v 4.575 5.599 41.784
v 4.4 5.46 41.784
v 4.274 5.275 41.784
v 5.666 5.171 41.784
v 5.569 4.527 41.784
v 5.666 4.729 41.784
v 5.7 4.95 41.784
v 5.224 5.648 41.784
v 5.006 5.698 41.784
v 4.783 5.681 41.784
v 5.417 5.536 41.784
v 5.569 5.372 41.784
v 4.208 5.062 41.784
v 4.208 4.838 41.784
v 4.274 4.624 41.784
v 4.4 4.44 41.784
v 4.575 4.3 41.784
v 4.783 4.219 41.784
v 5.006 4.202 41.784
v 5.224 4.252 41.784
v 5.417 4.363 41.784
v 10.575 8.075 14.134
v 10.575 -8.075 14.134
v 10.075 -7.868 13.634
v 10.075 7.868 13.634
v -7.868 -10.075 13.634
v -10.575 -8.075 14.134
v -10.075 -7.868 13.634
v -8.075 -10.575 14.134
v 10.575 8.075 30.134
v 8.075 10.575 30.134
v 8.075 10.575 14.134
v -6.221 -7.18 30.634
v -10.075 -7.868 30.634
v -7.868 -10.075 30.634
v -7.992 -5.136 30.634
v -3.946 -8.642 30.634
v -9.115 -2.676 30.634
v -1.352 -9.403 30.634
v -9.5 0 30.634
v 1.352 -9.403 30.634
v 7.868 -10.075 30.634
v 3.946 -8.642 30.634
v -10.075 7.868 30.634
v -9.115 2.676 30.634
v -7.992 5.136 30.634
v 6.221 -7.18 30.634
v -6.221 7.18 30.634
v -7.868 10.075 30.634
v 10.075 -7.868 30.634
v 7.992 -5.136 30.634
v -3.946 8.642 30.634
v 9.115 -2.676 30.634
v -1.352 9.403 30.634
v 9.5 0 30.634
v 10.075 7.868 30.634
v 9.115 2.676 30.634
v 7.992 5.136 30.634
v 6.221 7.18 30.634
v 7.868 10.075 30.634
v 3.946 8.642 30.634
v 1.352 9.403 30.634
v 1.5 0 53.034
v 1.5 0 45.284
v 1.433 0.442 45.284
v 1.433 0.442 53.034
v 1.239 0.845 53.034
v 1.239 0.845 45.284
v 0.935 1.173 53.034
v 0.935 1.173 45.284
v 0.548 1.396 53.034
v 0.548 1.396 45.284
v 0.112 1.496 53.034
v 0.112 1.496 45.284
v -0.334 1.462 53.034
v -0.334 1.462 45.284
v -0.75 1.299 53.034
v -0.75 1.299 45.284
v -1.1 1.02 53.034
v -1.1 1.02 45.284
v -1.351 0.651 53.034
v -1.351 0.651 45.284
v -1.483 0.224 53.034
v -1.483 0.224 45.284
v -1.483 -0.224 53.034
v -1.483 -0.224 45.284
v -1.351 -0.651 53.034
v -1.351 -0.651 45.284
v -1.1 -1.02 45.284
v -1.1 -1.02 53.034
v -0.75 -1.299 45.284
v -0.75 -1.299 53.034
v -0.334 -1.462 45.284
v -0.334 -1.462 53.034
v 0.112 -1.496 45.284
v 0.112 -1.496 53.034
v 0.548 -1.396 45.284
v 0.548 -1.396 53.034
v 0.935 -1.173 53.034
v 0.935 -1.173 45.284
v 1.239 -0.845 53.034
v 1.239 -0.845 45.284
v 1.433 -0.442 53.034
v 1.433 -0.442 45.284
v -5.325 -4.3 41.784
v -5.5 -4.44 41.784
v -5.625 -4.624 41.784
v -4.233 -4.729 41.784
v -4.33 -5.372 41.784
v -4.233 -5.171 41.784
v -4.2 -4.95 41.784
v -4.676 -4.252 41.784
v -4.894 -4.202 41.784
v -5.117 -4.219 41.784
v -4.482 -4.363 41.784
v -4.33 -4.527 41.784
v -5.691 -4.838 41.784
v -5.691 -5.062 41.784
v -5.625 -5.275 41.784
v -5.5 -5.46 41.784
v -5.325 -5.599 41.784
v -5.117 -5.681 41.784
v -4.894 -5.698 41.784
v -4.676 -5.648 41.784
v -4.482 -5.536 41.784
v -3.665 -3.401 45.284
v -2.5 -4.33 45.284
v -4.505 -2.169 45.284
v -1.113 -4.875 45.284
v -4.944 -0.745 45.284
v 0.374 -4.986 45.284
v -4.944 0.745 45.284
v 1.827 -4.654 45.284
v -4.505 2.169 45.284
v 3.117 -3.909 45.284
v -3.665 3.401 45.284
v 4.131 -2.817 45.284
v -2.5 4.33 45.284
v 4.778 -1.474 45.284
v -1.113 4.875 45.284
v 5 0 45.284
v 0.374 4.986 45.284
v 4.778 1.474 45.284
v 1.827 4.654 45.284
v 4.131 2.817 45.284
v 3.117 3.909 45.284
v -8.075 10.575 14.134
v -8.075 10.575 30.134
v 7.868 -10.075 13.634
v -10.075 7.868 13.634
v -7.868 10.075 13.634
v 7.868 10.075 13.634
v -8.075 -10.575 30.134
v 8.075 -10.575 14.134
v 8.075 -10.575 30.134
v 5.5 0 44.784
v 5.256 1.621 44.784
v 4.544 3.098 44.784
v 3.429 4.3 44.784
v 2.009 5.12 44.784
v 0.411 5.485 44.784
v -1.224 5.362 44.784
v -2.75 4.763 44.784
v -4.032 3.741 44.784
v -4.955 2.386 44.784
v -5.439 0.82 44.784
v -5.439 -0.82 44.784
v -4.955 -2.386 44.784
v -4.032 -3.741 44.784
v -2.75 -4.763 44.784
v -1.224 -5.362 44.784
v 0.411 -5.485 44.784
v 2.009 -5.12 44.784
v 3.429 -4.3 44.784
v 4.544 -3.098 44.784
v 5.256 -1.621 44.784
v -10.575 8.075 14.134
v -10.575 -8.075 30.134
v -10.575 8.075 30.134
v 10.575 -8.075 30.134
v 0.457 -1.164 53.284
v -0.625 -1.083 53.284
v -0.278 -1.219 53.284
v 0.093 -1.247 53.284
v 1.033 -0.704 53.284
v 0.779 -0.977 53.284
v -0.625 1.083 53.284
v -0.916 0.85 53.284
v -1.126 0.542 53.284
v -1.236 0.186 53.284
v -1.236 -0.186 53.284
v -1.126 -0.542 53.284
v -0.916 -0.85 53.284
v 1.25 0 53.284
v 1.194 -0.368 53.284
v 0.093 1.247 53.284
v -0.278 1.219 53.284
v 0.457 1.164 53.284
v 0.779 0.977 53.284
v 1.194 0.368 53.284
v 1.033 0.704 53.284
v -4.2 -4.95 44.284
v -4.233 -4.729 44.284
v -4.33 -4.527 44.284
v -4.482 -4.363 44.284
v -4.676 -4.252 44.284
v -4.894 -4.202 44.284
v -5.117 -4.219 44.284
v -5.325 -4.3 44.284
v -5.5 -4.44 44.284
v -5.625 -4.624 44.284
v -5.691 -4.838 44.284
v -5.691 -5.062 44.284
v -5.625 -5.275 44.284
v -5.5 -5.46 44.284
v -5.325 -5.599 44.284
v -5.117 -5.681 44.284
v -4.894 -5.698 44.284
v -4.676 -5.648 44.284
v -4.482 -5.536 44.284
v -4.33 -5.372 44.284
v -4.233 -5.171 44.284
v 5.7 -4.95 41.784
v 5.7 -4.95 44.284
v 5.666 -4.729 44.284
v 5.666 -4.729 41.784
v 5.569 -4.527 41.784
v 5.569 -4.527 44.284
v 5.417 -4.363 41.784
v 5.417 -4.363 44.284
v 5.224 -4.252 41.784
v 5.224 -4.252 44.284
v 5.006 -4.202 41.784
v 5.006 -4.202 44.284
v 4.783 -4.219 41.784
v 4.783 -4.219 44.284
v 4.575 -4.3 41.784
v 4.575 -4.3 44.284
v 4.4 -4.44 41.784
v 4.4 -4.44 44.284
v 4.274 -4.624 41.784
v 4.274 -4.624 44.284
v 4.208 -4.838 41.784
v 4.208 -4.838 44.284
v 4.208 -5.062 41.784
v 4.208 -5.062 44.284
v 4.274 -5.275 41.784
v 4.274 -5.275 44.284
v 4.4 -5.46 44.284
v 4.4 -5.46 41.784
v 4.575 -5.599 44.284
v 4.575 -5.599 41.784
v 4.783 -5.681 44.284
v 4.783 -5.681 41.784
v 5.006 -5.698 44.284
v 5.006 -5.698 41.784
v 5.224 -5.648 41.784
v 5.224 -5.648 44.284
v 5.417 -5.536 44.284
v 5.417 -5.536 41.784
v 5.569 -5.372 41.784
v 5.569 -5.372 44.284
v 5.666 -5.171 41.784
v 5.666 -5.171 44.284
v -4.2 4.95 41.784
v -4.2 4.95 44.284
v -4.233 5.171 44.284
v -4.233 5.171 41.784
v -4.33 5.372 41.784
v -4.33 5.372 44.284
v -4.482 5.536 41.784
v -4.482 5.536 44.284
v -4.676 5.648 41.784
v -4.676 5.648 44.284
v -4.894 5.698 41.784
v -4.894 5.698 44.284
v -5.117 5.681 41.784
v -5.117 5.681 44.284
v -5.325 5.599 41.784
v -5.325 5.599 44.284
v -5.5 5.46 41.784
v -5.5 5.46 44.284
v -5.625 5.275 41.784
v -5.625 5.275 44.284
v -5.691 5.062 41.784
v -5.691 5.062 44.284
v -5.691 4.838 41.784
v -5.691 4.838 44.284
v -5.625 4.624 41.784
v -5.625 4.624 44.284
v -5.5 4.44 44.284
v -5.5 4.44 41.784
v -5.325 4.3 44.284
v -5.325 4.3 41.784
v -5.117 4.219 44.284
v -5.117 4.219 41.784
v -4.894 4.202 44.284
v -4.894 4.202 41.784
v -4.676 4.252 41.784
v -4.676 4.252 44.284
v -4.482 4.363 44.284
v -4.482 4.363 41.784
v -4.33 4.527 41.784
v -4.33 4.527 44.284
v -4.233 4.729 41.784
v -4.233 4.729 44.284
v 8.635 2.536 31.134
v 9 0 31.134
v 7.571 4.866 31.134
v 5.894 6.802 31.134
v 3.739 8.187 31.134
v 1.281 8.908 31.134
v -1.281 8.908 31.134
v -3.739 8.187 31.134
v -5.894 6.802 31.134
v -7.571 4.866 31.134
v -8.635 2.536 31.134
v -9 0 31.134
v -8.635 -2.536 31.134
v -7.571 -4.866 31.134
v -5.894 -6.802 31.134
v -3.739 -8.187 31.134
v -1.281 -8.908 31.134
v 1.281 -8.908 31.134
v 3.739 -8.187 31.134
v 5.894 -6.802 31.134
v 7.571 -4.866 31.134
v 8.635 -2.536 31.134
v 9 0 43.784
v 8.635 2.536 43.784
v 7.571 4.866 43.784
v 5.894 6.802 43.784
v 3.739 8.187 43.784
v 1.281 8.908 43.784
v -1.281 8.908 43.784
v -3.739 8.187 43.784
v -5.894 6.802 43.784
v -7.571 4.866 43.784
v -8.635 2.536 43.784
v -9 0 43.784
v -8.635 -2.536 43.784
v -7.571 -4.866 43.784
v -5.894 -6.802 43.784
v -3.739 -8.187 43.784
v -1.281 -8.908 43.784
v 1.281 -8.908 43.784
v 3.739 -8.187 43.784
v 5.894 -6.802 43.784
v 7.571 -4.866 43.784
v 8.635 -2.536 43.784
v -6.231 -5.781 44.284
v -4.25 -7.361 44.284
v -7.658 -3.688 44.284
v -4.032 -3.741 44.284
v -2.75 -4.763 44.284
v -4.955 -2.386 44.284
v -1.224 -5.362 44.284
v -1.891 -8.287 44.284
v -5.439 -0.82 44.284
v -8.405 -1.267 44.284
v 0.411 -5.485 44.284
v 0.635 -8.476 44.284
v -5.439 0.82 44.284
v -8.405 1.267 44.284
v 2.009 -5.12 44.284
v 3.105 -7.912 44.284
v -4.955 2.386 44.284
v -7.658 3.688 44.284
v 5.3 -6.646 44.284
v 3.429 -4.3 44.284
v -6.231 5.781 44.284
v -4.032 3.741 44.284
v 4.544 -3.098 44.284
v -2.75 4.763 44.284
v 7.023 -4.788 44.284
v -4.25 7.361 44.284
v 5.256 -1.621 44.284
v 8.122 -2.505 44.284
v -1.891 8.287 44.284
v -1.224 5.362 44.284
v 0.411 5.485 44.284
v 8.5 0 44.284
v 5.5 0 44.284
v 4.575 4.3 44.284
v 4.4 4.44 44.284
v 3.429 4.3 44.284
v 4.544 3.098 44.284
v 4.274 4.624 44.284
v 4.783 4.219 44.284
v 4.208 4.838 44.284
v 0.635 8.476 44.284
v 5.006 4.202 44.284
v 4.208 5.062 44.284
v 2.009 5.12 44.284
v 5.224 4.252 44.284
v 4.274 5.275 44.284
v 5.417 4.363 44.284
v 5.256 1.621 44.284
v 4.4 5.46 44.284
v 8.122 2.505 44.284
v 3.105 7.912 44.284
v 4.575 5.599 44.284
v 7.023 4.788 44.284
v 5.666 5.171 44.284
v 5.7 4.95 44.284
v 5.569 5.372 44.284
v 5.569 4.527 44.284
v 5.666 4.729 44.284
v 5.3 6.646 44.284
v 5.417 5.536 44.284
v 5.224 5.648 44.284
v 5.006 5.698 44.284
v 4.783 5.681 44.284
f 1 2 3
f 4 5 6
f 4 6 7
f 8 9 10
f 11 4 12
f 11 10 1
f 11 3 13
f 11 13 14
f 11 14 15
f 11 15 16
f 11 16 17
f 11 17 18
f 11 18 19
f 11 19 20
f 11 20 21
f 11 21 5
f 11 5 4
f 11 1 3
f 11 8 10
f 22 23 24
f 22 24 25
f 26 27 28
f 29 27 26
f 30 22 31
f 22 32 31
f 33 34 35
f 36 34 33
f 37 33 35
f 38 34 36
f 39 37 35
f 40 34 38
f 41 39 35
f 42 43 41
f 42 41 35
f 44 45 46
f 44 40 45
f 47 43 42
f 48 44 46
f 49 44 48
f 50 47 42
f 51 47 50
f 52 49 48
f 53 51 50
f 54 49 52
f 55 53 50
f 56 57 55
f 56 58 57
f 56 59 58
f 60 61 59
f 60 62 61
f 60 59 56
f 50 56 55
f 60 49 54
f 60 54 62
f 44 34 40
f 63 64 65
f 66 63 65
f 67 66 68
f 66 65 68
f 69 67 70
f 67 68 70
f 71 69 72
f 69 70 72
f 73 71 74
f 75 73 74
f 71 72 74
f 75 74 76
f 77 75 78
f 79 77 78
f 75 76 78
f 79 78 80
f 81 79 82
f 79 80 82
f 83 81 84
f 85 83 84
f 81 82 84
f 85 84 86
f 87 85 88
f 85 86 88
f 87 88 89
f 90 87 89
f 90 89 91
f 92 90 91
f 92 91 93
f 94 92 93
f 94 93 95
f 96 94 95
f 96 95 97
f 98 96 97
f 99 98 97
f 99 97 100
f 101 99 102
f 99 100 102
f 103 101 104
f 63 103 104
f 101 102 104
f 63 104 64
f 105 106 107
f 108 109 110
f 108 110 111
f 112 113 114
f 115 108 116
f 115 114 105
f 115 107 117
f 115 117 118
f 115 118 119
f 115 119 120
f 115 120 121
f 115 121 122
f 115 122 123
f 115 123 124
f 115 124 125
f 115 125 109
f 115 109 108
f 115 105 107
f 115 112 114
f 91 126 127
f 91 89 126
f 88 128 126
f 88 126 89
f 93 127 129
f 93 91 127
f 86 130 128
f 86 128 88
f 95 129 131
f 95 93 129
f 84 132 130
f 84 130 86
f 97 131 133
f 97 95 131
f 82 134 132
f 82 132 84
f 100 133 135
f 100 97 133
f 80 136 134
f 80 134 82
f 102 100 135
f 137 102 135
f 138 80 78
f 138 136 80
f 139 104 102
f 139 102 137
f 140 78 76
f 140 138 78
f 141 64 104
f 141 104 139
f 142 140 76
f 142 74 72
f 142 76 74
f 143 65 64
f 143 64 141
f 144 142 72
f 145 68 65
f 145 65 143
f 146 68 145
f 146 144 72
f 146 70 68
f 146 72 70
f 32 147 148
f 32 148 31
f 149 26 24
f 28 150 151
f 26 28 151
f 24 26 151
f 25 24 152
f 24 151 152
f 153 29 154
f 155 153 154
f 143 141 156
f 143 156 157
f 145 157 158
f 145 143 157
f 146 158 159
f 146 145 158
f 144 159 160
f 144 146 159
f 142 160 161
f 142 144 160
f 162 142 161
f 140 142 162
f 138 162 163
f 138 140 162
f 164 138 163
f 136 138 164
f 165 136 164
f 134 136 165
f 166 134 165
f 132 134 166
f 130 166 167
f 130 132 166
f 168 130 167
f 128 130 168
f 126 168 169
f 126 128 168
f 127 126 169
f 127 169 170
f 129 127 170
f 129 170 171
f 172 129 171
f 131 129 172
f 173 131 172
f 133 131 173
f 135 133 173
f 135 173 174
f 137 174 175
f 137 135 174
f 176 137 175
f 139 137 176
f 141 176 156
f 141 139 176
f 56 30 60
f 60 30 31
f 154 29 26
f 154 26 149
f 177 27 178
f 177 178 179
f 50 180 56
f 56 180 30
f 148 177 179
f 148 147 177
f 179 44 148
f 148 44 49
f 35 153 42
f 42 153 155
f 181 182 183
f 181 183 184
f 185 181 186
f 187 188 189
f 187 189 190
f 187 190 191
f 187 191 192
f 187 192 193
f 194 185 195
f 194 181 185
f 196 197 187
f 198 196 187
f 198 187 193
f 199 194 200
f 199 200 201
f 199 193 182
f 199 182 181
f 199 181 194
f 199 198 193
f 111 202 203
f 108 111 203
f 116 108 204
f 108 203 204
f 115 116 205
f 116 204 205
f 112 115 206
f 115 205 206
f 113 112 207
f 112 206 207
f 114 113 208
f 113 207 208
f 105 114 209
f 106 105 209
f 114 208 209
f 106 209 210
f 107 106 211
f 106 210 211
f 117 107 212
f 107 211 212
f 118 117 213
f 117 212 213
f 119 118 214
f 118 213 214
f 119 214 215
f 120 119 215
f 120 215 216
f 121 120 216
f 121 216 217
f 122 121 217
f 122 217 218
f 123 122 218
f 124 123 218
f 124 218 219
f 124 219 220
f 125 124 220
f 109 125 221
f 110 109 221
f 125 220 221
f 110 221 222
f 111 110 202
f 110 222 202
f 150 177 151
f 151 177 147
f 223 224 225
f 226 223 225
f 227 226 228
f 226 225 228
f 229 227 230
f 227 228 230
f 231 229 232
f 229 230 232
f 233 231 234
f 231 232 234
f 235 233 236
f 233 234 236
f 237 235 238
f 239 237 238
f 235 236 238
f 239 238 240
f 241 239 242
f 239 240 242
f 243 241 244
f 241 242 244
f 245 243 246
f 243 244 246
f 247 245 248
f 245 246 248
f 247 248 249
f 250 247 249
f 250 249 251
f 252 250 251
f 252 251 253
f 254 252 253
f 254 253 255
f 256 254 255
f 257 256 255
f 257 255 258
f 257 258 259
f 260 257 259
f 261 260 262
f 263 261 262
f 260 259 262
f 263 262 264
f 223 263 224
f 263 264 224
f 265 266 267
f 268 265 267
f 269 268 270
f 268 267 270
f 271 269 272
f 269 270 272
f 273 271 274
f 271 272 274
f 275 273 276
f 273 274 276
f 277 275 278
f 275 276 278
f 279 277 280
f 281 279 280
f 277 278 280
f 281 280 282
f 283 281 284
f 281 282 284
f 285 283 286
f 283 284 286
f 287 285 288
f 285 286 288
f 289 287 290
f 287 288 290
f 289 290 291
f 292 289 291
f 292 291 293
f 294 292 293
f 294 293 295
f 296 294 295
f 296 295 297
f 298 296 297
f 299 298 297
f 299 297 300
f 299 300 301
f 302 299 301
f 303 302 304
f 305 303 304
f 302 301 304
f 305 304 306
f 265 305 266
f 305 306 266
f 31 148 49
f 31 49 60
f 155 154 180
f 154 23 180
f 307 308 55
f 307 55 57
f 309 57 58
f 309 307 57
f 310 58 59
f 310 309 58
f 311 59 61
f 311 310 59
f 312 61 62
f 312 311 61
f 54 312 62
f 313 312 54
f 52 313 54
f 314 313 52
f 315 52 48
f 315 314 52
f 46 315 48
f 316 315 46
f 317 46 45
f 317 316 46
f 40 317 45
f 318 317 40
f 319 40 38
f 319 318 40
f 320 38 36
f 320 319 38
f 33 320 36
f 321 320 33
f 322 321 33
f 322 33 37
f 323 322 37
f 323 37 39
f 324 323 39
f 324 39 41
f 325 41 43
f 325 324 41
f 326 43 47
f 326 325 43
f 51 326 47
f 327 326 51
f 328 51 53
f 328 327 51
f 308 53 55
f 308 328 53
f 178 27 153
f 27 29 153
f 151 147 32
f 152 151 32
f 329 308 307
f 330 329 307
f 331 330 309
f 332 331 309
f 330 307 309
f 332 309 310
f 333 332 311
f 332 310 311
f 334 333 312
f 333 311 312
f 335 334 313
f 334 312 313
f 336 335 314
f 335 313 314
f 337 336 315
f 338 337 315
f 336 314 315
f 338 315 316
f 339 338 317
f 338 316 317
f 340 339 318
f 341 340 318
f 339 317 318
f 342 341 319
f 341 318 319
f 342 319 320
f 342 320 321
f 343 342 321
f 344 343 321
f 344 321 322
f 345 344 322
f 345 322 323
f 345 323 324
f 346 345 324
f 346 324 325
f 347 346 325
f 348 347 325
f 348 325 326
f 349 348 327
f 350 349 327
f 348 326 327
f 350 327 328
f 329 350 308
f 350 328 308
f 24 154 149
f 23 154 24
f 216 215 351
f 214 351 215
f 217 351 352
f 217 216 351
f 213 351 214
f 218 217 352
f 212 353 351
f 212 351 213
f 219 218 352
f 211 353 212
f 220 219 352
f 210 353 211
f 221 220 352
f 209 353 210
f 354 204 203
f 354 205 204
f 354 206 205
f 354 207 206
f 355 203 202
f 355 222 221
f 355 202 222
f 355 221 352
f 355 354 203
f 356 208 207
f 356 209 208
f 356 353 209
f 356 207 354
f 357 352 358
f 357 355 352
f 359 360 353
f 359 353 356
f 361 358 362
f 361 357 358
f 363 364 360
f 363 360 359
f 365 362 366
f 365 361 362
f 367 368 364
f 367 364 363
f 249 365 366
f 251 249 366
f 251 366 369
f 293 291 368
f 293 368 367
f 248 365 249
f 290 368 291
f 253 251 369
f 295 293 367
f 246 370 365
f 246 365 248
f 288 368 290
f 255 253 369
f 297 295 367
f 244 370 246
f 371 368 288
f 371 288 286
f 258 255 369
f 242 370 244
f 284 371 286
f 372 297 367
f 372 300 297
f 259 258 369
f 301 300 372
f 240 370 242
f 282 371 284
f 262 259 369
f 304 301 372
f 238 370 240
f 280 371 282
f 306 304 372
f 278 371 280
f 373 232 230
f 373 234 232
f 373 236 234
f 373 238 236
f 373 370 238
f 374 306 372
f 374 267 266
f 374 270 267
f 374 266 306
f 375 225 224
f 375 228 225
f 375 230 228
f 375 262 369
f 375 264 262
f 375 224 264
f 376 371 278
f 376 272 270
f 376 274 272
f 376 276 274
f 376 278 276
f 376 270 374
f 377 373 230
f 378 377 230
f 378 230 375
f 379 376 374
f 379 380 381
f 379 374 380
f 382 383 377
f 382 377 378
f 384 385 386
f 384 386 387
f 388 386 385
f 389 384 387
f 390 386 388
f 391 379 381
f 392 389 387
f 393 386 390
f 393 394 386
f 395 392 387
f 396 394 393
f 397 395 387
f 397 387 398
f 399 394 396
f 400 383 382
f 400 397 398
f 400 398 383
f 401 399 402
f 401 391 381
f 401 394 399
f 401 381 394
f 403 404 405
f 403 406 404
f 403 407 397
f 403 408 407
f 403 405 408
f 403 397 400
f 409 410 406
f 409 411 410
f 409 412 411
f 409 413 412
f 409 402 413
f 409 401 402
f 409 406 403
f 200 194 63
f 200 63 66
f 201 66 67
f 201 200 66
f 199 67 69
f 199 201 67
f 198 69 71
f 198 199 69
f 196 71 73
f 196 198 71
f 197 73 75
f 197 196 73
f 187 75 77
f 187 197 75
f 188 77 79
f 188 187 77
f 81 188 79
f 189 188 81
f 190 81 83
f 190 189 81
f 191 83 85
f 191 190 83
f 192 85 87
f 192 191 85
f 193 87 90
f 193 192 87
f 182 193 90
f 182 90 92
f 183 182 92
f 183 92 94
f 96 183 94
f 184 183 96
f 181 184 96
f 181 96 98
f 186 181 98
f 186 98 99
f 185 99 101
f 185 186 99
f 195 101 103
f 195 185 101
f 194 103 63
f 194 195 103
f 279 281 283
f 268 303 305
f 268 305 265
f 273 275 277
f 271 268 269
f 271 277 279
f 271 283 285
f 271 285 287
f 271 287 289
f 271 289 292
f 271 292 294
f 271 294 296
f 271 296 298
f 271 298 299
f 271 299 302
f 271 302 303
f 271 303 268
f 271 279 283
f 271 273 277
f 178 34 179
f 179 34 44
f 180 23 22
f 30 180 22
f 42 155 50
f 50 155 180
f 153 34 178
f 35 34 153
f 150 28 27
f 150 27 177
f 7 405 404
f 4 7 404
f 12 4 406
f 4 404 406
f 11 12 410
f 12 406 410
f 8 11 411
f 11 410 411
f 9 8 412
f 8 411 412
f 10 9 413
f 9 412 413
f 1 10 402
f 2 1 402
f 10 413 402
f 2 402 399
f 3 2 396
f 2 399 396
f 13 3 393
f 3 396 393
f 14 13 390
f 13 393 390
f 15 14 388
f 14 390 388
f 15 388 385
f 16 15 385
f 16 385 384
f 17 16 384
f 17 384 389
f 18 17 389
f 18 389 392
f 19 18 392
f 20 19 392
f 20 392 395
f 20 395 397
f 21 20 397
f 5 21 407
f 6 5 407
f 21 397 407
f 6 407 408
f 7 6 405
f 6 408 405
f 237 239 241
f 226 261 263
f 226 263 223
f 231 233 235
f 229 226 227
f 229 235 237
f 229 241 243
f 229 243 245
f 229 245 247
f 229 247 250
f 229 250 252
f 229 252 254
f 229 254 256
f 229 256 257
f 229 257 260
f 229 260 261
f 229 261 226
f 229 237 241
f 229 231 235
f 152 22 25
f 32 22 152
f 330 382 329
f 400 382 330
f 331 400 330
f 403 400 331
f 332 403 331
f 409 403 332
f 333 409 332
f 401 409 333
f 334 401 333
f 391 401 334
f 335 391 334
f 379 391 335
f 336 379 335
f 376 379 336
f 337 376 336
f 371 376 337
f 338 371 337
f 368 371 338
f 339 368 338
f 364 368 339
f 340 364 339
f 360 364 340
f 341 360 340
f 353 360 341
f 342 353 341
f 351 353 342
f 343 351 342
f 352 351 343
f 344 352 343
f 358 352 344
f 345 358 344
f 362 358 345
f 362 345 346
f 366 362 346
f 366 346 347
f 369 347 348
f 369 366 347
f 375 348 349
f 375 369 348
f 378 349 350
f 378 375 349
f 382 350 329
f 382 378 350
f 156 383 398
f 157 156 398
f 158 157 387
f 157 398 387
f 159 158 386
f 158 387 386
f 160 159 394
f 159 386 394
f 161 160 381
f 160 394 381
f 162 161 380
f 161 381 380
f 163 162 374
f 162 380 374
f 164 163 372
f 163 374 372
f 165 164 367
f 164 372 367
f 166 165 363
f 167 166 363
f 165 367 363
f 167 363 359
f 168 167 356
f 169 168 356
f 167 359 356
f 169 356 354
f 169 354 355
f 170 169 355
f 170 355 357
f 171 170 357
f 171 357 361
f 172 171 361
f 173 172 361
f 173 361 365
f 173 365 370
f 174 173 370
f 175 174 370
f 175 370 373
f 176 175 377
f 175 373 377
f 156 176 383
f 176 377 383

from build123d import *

# Parameters (mm, degrees)
SKETCH1_W           = 42.3
SKETCH1_H           = 42.3
BOSS_EXTRUDE1_DEPTH = 34
CHAMFER1_SIZE       = 5
SKETCH2_R           = 18
BOSS_EXTRUDE2_DEPTH = 27.3
SKETCH3_R           = 11
BOSS_EXTRUDE3_DEPTH = 2
SKETCH4_R           = 3
BOSS_EXTRUDE4_DEPTH = 16
CHAMFER2_SIZE       = 1
CHAMFER3_SIZE       = 0.5
SKETCH5_R           = 1.5
CUT_EXTRUDE1_DEPTH  = 5
ECHELLE1_SCALE      = 2
ECHELLE2_SCALE      = 0.25


with BuildPart() as part:
    # Sketch1 → Boss-Extrude1 (new body)
    with BuildSketch(Plane.XY):
        Rectangle(SKETCH1_W, SKETCH1_H)
    extrude(amount=BOSS_EXTRUDE1_DEPTH)

    # Chamfer1
    chamfer1_edges = [part.edges().sort_by_distance(p)[0] for p in [
        (21.15, -21.15, 17),
        (-21.15, -21.15, 17),
        (-21.15, 21.15, 17),
        (21.15, 21.15, 17),
    ]]
    chamfer(chamfer1_edges, length=CHAMFER1_SIZE)

    # Sketch2 → Boss-Extrude2 (add)
    with BuildSketch(Plane.XY.offset(34)):
        Circle(SKETCH2_R)
    extrude(amount=BOSS_EXTRUDE2_DEPTH)

    # Sketch3 → Boss-Extrude3 (add)
    with BuildSketch(Plane.XY.offset(61.3)):
        Circle(SKETCH3_R)
    extrude(amount=BOSS_EXTRUDE3_DEPTH)

    # Sketch4 → Boss-Extrude4 (add)
    with BuildSketch(Plane.XY.offset(63.3)):
        Circle(SKETCH4_R)
    extrude(amount=BOSS_EXTRUDE4_DEPTH)

    # Chamfer2
    chamfer2_edges = [part.edges().sort_by_distance(p)[0] for p in [
        (0, -21.15, 0),
        (0, -21.15, 34),
        (21.15, 0, 0),
        (-21.15, 0, 0),
        (0, 21.15, 0),
        (18.65, 18.65, 0),
        (18.65, -18.65, 0),
        (-18.65, 18.65, 0),
        (-18.65, -18.65, 0),
        (-21.15, 0, 34),
        (21.15, 0, 34),
        (0, 21.15, 34),
        (18.65, 18.65, 34),
        (18.65, -18.65, 34),
        (-18.65, 18.65, 34),
        (-18.65, -18.65, 34),
        (-18, 0, 34),
        (-18, 0, 61.3),
        (-11, 0, 63.3),
    ]]
    chamfer(chamfer2_edges, length=CHAMFER2_SIZE)

    # Chamfer3
    chamfer3_edges = [part.edges().sort_by_distance(p)[0] for p in [
        (-3, 0, 79.3),
    ]]
    chamfer(chamfer3_edges, length=CHAMFER3_SIZE)

    # Sketch5 → Cut-Extrude1 (cut)
    with BuildSketch(Plane.XY.offset(61.3)):
        with Locations((9.899494937, 9.899494937)):
            Circle(SKETCH5_R)
        with Locations((9.899494937, -9.899494937)):
            Circle(SKETCH5_R)
        with Locations((-9.899494937, -9.899494937)):
            Circle(SKETCH5_R)
        with Locations((-9.899494937, 9.899494937)):
            Circle(SKETCH5_R)
    extrude(amount=-CUT_EXTRUDE1_DEPTH, mode=Mode.SUBTRACT)


with BuildPart() as part_1:
    # Echelle1: scaled about (0, 0, 27.268947418)
    add(part.part.scale(ECHELLE1_SCALE).moved(Location((0, 0, -27.268947418))))


with BuildPart() as part_2:
    # Echelle2: scaled about (0, 0, 27.268947418)
    add(part_1.part.scale(ECHELLE2_SCALE).moved(Location((0, 0, 20.451710564))))


solid = part_2.part
